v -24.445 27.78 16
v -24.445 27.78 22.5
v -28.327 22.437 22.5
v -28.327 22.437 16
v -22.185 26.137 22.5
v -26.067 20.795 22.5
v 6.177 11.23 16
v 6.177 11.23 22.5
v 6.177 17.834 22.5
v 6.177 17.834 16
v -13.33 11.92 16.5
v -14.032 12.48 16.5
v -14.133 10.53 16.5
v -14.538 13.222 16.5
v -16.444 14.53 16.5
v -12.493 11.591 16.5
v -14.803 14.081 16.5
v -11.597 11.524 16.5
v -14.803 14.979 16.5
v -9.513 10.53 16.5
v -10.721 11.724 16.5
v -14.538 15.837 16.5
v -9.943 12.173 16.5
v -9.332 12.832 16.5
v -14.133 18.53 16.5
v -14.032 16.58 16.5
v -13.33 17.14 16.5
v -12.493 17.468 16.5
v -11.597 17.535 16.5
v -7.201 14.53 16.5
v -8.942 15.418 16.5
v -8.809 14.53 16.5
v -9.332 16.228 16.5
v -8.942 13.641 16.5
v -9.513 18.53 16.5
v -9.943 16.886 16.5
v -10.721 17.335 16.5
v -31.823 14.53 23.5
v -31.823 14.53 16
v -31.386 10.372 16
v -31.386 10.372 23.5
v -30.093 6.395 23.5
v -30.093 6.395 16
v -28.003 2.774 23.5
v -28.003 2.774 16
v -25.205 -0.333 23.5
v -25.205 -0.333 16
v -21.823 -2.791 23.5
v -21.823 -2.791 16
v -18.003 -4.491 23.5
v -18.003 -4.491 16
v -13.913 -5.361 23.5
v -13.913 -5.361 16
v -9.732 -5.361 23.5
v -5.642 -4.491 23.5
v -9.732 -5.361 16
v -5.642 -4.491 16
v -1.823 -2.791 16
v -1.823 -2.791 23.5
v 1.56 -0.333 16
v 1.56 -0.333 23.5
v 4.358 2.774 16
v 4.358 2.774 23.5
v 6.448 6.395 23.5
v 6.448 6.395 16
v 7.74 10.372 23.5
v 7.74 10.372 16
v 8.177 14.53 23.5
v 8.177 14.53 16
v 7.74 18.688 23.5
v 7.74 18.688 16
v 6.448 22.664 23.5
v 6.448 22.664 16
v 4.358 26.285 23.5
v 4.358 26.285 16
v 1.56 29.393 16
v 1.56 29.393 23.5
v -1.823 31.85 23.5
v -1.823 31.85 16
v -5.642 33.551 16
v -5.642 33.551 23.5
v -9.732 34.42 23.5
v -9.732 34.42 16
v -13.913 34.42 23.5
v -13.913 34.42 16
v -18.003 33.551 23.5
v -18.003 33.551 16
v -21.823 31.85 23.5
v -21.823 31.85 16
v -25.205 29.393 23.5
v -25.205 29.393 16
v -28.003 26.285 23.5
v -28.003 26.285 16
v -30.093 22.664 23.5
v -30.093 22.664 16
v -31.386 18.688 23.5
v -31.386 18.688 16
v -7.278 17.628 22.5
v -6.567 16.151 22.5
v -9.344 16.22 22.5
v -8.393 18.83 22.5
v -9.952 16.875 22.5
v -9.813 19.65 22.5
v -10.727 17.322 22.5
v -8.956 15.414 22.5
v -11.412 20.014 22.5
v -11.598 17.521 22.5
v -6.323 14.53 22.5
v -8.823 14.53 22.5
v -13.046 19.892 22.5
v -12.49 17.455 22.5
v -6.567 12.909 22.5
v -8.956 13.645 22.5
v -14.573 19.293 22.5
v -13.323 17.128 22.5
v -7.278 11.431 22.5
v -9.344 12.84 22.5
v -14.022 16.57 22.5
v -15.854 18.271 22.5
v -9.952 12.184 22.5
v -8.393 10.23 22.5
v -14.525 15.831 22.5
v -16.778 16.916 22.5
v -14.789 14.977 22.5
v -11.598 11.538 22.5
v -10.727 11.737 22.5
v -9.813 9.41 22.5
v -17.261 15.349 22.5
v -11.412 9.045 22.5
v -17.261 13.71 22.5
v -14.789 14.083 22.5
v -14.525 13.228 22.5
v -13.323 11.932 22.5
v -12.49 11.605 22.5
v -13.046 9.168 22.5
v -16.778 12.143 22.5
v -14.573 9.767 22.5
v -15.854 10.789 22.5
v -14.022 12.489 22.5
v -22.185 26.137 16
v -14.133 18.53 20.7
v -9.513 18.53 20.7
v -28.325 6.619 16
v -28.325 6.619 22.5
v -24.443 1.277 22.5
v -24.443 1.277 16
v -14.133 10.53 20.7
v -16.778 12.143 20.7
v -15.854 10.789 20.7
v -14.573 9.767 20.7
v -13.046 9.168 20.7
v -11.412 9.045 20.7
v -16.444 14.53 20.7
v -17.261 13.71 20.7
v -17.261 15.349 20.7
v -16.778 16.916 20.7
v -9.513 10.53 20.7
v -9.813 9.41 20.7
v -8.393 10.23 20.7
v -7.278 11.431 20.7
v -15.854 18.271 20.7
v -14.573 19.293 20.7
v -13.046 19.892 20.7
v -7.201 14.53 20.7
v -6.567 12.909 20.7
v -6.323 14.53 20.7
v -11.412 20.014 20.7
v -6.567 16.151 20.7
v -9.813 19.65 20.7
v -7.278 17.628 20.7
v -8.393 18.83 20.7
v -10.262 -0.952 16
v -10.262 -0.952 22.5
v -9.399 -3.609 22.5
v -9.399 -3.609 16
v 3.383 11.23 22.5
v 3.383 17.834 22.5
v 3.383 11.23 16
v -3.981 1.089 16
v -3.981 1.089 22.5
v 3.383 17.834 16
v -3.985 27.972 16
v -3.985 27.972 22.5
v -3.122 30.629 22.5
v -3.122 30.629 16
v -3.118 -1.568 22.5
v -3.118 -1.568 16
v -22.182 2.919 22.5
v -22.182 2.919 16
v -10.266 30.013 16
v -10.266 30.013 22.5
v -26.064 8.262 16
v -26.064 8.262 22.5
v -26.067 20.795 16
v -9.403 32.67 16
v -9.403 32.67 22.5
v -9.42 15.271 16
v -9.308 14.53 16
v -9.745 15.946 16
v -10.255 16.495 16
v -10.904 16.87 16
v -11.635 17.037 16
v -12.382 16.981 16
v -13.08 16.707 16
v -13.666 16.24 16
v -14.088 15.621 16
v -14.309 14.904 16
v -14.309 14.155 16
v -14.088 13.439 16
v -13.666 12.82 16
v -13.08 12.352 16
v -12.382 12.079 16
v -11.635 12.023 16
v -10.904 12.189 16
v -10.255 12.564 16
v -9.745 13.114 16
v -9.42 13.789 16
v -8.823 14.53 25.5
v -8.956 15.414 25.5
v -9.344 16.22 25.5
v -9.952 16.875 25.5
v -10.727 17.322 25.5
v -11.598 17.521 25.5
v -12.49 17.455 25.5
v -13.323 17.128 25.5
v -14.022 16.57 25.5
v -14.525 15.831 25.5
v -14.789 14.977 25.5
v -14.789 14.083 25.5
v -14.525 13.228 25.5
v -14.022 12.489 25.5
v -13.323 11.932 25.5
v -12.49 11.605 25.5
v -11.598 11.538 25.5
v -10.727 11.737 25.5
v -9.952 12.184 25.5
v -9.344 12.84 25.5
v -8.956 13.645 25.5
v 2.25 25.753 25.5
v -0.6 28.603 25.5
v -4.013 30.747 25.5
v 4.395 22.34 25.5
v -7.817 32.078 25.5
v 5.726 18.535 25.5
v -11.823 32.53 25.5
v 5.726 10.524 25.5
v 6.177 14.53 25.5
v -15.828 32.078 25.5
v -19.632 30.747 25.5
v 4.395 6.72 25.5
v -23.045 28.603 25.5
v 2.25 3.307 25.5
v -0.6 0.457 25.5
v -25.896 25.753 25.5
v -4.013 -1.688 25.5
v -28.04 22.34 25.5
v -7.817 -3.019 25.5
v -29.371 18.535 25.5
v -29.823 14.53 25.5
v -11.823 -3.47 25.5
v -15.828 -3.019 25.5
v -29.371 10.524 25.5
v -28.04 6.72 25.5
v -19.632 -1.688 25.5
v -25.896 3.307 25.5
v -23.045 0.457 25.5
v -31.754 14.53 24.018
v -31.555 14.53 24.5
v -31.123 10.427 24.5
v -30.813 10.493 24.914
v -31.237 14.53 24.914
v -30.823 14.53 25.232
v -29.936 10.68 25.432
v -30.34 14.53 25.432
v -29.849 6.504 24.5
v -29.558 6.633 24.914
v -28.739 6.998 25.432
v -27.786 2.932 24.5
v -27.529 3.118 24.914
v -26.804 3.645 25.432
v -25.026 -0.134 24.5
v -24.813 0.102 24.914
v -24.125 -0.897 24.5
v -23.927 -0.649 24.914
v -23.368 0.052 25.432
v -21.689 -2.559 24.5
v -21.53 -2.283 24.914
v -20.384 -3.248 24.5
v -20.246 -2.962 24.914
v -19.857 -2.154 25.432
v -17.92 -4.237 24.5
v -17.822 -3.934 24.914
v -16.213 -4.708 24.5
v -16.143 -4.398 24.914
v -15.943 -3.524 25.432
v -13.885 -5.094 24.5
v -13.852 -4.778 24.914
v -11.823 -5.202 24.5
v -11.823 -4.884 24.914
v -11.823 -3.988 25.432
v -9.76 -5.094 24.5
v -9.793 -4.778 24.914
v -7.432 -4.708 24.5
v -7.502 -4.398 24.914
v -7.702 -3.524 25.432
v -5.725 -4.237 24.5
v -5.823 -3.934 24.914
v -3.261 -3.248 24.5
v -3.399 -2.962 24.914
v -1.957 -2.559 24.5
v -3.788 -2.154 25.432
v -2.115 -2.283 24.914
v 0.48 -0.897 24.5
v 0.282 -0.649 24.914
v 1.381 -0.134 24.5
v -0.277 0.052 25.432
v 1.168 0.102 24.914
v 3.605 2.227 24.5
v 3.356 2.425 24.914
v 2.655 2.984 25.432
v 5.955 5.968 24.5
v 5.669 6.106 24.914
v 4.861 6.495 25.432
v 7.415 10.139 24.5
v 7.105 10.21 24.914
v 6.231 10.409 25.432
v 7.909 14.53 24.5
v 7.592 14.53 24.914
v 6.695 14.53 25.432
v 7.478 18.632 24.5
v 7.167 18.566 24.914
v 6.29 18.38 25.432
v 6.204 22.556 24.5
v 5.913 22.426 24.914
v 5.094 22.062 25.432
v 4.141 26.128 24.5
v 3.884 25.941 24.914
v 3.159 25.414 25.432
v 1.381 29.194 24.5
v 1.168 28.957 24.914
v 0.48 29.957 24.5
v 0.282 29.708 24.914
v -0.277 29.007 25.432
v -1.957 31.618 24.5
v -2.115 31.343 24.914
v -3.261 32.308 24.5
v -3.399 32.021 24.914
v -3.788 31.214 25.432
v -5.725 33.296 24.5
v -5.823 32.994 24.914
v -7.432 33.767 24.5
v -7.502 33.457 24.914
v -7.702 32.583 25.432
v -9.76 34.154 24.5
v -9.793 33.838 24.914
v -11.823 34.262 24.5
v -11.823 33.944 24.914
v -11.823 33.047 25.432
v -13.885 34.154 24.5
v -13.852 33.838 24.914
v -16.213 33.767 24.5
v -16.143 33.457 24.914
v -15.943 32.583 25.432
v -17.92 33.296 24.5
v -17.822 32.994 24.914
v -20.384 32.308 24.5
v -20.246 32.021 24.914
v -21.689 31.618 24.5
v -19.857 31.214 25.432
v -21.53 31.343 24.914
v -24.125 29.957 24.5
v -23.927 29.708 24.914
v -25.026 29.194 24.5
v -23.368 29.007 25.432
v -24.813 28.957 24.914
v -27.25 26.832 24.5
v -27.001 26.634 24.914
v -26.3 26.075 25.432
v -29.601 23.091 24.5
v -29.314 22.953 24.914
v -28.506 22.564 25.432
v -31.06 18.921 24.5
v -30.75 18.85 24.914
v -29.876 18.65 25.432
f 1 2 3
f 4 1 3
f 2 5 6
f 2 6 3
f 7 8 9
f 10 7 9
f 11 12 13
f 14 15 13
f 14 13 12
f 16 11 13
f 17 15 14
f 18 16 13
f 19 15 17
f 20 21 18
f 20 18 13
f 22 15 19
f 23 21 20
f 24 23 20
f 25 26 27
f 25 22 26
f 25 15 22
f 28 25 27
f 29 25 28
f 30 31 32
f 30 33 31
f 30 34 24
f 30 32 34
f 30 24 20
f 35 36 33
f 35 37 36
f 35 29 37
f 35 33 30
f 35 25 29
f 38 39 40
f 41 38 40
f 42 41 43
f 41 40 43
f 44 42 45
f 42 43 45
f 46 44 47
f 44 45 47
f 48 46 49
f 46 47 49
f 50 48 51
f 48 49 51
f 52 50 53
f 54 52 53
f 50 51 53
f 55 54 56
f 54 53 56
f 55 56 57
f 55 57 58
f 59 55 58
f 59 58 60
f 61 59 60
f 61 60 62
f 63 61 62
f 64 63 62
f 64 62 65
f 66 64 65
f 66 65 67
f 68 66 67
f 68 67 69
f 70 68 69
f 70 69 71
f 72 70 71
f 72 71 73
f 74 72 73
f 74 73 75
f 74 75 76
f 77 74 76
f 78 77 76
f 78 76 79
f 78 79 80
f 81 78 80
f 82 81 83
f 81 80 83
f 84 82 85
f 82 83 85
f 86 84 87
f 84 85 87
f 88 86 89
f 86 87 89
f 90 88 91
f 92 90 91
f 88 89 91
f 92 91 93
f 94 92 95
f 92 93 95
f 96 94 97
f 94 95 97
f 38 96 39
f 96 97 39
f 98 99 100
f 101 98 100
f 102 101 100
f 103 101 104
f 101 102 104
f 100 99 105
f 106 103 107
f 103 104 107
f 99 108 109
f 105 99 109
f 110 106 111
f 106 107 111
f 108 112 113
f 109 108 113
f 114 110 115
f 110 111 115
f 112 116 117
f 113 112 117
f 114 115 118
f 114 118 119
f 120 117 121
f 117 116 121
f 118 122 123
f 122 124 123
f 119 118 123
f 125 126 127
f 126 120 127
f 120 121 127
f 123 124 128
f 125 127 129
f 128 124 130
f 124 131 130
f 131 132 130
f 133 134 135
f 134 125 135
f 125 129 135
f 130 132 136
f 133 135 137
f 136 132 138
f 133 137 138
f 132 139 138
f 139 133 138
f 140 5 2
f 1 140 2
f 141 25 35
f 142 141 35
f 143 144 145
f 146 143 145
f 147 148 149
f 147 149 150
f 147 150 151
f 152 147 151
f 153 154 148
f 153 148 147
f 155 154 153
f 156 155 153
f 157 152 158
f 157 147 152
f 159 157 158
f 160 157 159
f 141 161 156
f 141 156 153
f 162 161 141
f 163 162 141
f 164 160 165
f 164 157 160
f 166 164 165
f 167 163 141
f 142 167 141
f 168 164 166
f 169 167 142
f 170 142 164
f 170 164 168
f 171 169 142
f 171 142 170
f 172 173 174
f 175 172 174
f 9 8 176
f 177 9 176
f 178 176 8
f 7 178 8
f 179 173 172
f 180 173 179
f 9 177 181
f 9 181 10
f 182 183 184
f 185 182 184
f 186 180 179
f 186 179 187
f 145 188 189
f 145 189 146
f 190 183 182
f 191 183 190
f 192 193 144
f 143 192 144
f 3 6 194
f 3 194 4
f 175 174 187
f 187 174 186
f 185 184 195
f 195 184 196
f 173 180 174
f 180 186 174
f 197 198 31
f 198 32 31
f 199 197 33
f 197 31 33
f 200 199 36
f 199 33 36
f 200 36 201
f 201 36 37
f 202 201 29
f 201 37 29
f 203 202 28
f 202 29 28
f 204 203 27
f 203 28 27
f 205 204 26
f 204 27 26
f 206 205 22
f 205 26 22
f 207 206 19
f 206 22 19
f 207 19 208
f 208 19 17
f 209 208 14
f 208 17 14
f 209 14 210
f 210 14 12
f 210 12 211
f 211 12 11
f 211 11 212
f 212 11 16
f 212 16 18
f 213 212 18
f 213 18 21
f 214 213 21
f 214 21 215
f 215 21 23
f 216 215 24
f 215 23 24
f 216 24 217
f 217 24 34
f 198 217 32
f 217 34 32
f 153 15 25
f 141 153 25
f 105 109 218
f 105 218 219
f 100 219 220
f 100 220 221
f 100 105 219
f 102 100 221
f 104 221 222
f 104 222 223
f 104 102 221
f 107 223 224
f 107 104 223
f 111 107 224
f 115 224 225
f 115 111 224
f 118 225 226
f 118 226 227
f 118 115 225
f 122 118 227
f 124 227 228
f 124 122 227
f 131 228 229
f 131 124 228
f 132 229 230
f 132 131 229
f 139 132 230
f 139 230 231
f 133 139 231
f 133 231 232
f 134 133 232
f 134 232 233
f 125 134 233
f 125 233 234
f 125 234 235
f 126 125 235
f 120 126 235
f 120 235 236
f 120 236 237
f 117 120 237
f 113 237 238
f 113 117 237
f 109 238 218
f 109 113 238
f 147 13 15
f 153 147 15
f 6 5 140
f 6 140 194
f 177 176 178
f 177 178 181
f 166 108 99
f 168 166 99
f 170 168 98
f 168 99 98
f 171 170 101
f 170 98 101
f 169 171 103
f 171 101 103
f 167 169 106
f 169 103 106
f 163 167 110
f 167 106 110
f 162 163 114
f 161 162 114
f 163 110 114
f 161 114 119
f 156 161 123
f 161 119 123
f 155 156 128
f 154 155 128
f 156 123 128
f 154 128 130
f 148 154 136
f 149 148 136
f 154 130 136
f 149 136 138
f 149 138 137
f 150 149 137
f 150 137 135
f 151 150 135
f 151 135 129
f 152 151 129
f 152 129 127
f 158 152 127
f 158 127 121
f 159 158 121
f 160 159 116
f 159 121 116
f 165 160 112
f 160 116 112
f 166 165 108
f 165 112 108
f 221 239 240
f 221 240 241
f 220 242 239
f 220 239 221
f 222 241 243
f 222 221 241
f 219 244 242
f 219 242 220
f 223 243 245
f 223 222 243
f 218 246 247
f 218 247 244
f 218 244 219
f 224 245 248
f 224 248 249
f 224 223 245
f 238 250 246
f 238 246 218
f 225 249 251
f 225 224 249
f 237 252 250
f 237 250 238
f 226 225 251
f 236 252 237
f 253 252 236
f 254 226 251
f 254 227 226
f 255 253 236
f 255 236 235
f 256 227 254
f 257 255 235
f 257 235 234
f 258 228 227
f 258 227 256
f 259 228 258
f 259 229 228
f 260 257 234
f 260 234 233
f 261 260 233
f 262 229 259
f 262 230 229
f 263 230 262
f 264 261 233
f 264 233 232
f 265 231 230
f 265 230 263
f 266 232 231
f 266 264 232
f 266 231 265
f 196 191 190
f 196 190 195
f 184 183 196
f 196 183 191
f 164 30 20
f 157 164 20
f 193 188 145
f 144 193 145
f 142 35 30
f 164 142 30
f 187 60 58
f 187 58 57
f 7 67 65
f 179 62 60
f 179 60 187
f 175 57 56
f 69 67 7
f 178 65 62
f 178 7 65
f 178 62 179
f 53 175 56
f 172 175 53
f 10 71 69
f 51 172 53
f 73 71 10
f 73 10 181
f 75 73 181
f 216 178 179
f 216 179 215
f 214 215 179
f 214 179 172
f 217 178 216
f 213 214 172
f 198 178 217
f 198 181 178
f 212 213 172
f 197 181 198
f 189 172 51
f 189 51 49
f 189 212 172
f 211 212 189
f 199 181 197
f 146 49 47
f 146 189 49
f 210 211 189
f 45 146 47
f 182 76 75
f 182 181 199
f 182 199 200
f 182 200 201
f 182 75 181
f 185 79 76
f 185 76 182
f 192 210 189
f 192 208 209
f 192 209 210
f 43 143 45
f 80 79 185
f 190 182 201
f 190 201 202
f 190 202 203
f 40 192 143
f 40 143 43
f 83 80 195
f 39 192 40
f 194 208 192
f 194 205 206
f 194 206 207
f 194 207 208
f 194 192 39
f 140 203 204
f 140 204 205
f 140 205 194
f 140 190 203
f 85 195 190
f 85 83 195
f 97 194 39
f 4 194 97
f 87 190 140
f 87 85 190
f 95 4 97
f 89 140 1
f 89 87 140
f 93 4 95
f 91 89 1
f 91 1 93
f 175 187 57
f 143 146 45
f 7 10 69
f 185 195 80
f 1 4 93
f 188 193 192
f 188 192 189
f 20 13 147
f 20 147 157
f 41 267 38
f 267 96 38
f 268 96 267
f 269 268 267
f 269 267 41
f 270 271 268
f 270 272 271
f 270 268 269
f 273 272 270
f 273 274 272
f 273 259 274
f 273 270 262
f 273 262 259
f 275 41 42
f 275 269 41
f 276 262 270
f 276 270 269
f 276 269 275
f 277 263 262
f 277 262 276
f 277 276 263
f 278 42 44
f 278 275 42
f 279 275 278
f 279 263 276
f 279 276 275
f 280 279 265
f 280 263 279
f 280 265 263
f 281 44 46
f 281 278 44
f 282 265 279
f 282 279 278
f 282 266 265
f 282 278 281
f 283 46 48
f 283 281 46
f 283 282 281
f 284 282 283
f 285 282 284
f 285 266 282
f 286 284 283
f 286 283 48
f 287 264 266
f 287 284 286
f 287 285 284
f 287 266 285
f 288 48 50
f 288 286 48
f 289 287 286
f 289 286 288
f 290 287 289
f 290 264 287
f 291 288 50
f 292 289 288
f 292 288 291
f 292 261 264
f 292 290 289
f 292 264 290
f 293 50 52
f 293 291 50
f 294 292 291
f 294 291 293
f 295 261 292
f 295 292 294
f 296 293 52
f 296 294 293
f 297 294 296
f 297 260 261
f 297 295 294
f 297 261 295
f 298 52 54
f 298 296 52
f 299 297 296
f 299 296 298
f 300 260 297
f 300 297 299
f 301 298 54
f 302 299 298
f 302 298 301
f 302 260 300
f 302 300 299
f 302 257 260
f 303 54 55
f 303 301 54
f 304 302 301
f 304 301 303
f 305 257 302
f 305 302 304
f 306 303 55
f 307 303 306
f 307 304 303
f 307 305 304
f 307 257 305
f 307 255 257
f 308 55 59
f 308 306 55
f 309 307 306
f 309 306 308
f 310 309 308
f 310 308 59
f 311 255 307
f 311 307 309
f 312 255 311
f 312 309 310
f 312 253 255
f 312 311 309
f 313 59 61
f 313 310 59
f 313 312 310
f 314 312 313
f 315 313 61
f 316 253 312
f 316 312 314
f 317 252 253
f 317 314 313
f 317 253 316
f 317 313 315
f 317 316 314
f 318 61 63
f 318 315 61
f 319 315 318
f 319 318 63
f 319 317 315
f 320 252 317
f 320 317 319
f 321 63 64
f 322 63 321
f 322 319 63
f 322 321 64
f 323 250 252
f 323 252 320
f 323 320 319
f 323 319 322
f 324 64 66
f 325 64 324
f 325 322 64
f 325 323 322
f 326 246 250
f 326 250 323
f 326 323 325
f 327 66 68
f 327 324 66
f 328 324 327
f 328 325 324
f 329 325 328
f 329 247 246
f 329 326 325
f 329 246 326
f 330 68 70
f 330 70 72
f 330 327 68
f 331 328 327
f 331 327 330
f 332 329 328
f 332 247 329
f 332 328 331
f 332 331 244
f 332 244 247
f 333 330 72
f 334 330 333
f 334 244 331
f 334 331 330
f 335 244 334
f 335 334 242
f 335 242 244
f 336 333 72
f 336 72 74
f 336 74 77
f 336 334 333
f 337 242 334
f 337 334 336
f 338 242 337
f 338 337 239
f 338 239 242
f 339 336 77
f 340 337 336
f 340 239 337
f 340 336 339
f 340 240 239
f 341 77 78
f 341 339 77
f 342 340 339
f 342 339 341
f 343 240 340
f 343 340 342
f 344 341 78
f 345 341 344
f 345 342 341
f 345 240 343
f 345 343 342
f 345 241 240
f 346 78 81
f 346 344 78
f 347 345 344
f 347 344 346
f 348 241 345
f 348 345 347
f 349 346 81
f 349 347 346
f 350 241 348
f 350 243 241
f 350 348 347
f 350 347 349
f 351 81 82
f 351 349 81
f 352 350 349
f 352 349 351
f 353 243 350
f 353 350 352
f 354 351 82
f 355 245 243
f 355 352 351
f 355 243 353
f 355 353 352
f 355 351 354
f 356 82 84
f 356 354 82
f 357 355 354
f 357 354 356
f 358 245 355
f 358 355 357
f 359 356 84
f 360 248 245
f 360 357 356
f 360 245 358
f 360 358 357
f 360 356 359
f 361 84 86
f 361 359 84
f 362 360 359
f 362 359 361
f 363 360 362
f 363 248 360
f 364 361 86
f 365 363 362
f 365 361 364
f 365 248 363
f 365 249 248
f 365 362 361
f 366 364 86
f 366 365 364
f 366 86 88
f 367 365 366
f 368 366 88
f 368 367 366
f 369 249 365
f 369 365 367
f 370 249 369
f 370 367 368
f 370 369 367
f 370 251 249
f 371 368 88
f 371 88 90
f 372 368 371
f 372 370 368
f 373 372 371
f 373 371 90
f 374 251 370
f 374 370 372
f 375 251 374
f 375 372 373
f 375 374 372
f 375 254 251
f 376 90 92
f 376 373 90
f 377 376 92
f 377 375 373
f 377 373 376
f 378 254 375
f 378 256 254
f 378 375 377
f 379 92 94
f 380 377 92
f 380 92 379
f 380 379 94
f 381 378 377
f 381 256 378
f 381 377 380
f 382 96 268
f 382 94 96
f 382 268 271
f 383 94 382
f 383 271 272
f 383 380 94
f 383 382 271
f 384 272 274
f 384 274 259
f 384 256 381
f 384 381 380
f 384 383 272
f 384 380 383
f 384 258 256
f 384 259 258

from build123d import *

# Parameters (mm, degrees)
SKETCH1_R                       = 20
SKETCH1_R_2                     = 1
BOSS_EXTRUDE1_DEPTH             = 22.5
TAP_DRILL_FOR_M5X0_8_TAP1_D     = 4.2
TAP_DRILL_FOR_M5X0_8_TAP1_DEPTH = 5
TAP_DRILL_FOR_M5X0_8_TAP1_TIP   = 1.2618073
SKETCH4_W                       = 2.794
SKETCH4_H                       = 6.604
CUT_EXTRUDE1_DEPTH              = 20.5
CIRPATTERN1_COUNT               = 5
CUT_EXTRUDE3_START              = -6
SKETCH6_W                       = 4.62
SKETCH6_H                       = 8
SKETCH6_R                       = 2.1
CUT_EXTRUDE3_DEPTH              = 6
SKETCH7_R                       = 5.5
CUT_EXTRUDE4_DEPTH              = 1.8
SKETCH9_R                       = 3.014010562
CUT_EXTRUDE5_DEPTH              = 2
CHAMFER1_SIZE                   = 2
SKETCH8_R                       = 20
SKETCH8_R_2                     = 3
BOSS_EXTRUDE2_DEPTH             = 3
SKETCH5_R                       = 6
SKETCH5_R_2                     = 5
CUT_EXTRUDE2_DEPTH              = 1
FILLET3_R                       = 0.5
FILLET4_R                       = 2
SKETCH10_W                      = 43.83789535
SKETCH10_H                      = 47.8950696
CUT_EXTRUDE6_DEPTH              = 16


with BuildPart() as part:
    # Sketch1 → Boss-Extrude1 (new body)
    with BuildSketch(Plane.XY):
        with Locations(Location((-11.822558412, 14.529752947, 0), (0, 0, 180))):
            Circle(SKETCH1_R)
        with Locations(Location((-11.822558412, 14.529752947, 0), (0, 0, 180))):
            Circle(SKETCH1_R_2, mode=Mode.SUBTRACT)
    extrude(amount=BOSS_EXTRUDE1_DEPTH)

    # Tap Drill for M5x0.8 Tap1
    with Locations(Plane.XY.offset(22.5)):
        with Locations((-11.822558412, 14.529752947)):
            Hole(TAP_DRILL_FOR_M5X0_8_TAP1_D / 2, depth=TAP_DRILL_FOR_M5X0_8_TAP1_DEPTH)
            with Locations((0, 0, -(TAP_DRILL_FOR_M5X0_8_TAP1_DEPTH + TAP_DRILL_FOR_M5X0_8_TAP1_TIP / 2))):  # 118° drill point
                Cone(0, TAP_DRILL_FOR_M5X0_8_TAP1_D / 2, TAP_DRILL_FOR_M5X0_8_TAP1_TIP, mode=Mode.SUBTRACT)

    # Sketch4 → Cut-Extrude1 (cut)
    with BuildSketch(Plane.XY.offset(22.5)):
        with Locations((4.780441588, 14.531752947)):
            Rectangle(SKETCH4_W, SKETCH4_H)
    cut_extrude1 = extrude(amount=-CUT_EXTRUDE1_DEPTH, mode=Mode.SUBTRACT)

    # CirPattern1: Cut-Extrude1 ×5 about axis
    cirpattern1_axis = Axis((-11.822558412, 14.529752947, 0), (0, 0, 1))
    for i in range(1, CIRPATTERN1_COUNT):
        add(cut_extrude1.rotate(cirpattern1_axis, i * 360 / CIRPATTERN1_COUNT), mode=Mode.SUBTRACT)

    # Sketch6 → Cut-Extrude3 (cut)
    # profile 1 of 4: a face of its own
    with BuildSketch(Plane.XY.offset(22.5).offset(CUT_EXTRUDE3_START)):
        Polygon((-16.444354251, 14.529752947), (-14.132558412, 18.529752947), (-14.132558412, 10.529752947), align=None)
    # profile 2 of 4: a face of its own
    with BuildSketch(Plane.XY.offset(22.5).offset(CUT_EXTRUDE3_START)):
        Polygon((-7.200762573, 14.529752947), (-9.512558412, 10.529752947), (-9.512558412, 18.529752947), align=None)
    # profile 3 of 4: a face of its own
    with BuildSketch(Plane.XY.offset(22.5).offset(CUT_EXTRUDE3_START)):
        with Locations((-11.822558412, 14.529752947)):
            Rectangle(SKETCH6_W, SKETCH6_H)
        with Locations((-11.822558412, 14.529752947)):
            Circle(SKETCH6_R, mode=Mode.SUBTRACT)
    # profile 4 of 4: a face of its own
    with BuildSketch(Plane.XY.offset(22.5).offset(CUT_EXTRUDE3_START)):
        with Locations((-11.822558412, 14.529752947)):
            Circle(SKETCH6_R)
    extrude(amount=CUT_EXTRUDE3_DEPTH, mode=Mode.SUBTRACT)

    # Sketch7 → Cut-Extrude4 (cut)
    with BuildSketch(Plane.XY.offset(22.5)):
        with Locations((-11.822558412, 14.529752947)):
            Circle(SKETCH7_R)
    extrude(amount=-CUT_EXTRUDE4_DEPTH, mode=Mode.SUBTRACT)

    # Sketch9 → Cut-Extrude5 (cut)
    with BuildSketch(Plane.XY.offset(16.5)):
        with Locations((-11.822558412, 14.529752947)):
            Circle(SKETCH9_R)
    extrude(amount=-CUT_EXTRUDE5_DEPTH, mode=Mode.SUBTRACT)

    # Chamfer1
    chamfer1_edges = [part.edges().sort_by_distance(p)[0] for p in [
        (-14.836568974, 14.529752947, 14.5),
    ]]
    chamfer(chamfer1_edges, length=CHAMFER1_SIZE - 0.0001)  # a hair under: the kernel refuses the full size

    # Sketch8 → Boss-Extrude2 (add)
    with BuildSketch(Plane.XY.offset(22.5)):
        with Locations(Location((-11.822558412, 14.529752947, 0), (0, 0, 180))):
            Circle(SKETCH8_R)
        with Locations((-11.822558412, 14.529752947)):
            Circle(SKETCH8_R_2, mode=Mode.SUBTRACT)
    extrude(amount=BOSS_EXTRUDE2_DEPTH)

    # Sketch5 → Cut-Extrude2 (cut)
    with BuildSketch(Plane(origin=(0, 0, 0), x_dir=(-1, 0, 0), z_dir=(0, 0, -1))):
        with Locations((11.822558412, 14.529752947)):
            Circle(SKETCH5_R)
        with Locations((11.822558412, 14.529752947)):
            Circle(SKETCH5_R_2, mode=Mode.SUBTRACT)
    extrude(amount=-CUT_EXTRUDE2_DEPTH, mode=Mode.SUBTRACT)

    # Fillet3
    fillet3_edges = [part.edges().sort_by_distance(p)[0] for p in [
        (-5.822558412, 14.529752947, 1),
        (-6.822558412, 14.529752947, 1),
    ]]
    fillet(fillet3_edges, radius=FILLET3_R - 0.0001)  # a hair under: the kernel refuses the full size

    # Fillet4
    fillet4_edges = [part.edges().sort_by_distance(p)[0] for p in [
        (8.177441588, 14.529752947, 25.5),
    ]]
    fillet(fillet4_edges, radius=FILLET4_R)

    # Sketch10 → Cut-Extrude6 (cut)
    with BuildSketch(Plane(origin=(0, 0, 0), x_dir=(-1, 0, 0), z_dir=(0, 0, -1))):
        with Locations((12.103243423, 14.057691792)):
            Rectangle(SKETCH10_W, SKETCH10_H)
    extrude(amount=-CUT_EXTRUDE6_DEPTH, mode=Mode.SUBTRACT)


solid = part.part
